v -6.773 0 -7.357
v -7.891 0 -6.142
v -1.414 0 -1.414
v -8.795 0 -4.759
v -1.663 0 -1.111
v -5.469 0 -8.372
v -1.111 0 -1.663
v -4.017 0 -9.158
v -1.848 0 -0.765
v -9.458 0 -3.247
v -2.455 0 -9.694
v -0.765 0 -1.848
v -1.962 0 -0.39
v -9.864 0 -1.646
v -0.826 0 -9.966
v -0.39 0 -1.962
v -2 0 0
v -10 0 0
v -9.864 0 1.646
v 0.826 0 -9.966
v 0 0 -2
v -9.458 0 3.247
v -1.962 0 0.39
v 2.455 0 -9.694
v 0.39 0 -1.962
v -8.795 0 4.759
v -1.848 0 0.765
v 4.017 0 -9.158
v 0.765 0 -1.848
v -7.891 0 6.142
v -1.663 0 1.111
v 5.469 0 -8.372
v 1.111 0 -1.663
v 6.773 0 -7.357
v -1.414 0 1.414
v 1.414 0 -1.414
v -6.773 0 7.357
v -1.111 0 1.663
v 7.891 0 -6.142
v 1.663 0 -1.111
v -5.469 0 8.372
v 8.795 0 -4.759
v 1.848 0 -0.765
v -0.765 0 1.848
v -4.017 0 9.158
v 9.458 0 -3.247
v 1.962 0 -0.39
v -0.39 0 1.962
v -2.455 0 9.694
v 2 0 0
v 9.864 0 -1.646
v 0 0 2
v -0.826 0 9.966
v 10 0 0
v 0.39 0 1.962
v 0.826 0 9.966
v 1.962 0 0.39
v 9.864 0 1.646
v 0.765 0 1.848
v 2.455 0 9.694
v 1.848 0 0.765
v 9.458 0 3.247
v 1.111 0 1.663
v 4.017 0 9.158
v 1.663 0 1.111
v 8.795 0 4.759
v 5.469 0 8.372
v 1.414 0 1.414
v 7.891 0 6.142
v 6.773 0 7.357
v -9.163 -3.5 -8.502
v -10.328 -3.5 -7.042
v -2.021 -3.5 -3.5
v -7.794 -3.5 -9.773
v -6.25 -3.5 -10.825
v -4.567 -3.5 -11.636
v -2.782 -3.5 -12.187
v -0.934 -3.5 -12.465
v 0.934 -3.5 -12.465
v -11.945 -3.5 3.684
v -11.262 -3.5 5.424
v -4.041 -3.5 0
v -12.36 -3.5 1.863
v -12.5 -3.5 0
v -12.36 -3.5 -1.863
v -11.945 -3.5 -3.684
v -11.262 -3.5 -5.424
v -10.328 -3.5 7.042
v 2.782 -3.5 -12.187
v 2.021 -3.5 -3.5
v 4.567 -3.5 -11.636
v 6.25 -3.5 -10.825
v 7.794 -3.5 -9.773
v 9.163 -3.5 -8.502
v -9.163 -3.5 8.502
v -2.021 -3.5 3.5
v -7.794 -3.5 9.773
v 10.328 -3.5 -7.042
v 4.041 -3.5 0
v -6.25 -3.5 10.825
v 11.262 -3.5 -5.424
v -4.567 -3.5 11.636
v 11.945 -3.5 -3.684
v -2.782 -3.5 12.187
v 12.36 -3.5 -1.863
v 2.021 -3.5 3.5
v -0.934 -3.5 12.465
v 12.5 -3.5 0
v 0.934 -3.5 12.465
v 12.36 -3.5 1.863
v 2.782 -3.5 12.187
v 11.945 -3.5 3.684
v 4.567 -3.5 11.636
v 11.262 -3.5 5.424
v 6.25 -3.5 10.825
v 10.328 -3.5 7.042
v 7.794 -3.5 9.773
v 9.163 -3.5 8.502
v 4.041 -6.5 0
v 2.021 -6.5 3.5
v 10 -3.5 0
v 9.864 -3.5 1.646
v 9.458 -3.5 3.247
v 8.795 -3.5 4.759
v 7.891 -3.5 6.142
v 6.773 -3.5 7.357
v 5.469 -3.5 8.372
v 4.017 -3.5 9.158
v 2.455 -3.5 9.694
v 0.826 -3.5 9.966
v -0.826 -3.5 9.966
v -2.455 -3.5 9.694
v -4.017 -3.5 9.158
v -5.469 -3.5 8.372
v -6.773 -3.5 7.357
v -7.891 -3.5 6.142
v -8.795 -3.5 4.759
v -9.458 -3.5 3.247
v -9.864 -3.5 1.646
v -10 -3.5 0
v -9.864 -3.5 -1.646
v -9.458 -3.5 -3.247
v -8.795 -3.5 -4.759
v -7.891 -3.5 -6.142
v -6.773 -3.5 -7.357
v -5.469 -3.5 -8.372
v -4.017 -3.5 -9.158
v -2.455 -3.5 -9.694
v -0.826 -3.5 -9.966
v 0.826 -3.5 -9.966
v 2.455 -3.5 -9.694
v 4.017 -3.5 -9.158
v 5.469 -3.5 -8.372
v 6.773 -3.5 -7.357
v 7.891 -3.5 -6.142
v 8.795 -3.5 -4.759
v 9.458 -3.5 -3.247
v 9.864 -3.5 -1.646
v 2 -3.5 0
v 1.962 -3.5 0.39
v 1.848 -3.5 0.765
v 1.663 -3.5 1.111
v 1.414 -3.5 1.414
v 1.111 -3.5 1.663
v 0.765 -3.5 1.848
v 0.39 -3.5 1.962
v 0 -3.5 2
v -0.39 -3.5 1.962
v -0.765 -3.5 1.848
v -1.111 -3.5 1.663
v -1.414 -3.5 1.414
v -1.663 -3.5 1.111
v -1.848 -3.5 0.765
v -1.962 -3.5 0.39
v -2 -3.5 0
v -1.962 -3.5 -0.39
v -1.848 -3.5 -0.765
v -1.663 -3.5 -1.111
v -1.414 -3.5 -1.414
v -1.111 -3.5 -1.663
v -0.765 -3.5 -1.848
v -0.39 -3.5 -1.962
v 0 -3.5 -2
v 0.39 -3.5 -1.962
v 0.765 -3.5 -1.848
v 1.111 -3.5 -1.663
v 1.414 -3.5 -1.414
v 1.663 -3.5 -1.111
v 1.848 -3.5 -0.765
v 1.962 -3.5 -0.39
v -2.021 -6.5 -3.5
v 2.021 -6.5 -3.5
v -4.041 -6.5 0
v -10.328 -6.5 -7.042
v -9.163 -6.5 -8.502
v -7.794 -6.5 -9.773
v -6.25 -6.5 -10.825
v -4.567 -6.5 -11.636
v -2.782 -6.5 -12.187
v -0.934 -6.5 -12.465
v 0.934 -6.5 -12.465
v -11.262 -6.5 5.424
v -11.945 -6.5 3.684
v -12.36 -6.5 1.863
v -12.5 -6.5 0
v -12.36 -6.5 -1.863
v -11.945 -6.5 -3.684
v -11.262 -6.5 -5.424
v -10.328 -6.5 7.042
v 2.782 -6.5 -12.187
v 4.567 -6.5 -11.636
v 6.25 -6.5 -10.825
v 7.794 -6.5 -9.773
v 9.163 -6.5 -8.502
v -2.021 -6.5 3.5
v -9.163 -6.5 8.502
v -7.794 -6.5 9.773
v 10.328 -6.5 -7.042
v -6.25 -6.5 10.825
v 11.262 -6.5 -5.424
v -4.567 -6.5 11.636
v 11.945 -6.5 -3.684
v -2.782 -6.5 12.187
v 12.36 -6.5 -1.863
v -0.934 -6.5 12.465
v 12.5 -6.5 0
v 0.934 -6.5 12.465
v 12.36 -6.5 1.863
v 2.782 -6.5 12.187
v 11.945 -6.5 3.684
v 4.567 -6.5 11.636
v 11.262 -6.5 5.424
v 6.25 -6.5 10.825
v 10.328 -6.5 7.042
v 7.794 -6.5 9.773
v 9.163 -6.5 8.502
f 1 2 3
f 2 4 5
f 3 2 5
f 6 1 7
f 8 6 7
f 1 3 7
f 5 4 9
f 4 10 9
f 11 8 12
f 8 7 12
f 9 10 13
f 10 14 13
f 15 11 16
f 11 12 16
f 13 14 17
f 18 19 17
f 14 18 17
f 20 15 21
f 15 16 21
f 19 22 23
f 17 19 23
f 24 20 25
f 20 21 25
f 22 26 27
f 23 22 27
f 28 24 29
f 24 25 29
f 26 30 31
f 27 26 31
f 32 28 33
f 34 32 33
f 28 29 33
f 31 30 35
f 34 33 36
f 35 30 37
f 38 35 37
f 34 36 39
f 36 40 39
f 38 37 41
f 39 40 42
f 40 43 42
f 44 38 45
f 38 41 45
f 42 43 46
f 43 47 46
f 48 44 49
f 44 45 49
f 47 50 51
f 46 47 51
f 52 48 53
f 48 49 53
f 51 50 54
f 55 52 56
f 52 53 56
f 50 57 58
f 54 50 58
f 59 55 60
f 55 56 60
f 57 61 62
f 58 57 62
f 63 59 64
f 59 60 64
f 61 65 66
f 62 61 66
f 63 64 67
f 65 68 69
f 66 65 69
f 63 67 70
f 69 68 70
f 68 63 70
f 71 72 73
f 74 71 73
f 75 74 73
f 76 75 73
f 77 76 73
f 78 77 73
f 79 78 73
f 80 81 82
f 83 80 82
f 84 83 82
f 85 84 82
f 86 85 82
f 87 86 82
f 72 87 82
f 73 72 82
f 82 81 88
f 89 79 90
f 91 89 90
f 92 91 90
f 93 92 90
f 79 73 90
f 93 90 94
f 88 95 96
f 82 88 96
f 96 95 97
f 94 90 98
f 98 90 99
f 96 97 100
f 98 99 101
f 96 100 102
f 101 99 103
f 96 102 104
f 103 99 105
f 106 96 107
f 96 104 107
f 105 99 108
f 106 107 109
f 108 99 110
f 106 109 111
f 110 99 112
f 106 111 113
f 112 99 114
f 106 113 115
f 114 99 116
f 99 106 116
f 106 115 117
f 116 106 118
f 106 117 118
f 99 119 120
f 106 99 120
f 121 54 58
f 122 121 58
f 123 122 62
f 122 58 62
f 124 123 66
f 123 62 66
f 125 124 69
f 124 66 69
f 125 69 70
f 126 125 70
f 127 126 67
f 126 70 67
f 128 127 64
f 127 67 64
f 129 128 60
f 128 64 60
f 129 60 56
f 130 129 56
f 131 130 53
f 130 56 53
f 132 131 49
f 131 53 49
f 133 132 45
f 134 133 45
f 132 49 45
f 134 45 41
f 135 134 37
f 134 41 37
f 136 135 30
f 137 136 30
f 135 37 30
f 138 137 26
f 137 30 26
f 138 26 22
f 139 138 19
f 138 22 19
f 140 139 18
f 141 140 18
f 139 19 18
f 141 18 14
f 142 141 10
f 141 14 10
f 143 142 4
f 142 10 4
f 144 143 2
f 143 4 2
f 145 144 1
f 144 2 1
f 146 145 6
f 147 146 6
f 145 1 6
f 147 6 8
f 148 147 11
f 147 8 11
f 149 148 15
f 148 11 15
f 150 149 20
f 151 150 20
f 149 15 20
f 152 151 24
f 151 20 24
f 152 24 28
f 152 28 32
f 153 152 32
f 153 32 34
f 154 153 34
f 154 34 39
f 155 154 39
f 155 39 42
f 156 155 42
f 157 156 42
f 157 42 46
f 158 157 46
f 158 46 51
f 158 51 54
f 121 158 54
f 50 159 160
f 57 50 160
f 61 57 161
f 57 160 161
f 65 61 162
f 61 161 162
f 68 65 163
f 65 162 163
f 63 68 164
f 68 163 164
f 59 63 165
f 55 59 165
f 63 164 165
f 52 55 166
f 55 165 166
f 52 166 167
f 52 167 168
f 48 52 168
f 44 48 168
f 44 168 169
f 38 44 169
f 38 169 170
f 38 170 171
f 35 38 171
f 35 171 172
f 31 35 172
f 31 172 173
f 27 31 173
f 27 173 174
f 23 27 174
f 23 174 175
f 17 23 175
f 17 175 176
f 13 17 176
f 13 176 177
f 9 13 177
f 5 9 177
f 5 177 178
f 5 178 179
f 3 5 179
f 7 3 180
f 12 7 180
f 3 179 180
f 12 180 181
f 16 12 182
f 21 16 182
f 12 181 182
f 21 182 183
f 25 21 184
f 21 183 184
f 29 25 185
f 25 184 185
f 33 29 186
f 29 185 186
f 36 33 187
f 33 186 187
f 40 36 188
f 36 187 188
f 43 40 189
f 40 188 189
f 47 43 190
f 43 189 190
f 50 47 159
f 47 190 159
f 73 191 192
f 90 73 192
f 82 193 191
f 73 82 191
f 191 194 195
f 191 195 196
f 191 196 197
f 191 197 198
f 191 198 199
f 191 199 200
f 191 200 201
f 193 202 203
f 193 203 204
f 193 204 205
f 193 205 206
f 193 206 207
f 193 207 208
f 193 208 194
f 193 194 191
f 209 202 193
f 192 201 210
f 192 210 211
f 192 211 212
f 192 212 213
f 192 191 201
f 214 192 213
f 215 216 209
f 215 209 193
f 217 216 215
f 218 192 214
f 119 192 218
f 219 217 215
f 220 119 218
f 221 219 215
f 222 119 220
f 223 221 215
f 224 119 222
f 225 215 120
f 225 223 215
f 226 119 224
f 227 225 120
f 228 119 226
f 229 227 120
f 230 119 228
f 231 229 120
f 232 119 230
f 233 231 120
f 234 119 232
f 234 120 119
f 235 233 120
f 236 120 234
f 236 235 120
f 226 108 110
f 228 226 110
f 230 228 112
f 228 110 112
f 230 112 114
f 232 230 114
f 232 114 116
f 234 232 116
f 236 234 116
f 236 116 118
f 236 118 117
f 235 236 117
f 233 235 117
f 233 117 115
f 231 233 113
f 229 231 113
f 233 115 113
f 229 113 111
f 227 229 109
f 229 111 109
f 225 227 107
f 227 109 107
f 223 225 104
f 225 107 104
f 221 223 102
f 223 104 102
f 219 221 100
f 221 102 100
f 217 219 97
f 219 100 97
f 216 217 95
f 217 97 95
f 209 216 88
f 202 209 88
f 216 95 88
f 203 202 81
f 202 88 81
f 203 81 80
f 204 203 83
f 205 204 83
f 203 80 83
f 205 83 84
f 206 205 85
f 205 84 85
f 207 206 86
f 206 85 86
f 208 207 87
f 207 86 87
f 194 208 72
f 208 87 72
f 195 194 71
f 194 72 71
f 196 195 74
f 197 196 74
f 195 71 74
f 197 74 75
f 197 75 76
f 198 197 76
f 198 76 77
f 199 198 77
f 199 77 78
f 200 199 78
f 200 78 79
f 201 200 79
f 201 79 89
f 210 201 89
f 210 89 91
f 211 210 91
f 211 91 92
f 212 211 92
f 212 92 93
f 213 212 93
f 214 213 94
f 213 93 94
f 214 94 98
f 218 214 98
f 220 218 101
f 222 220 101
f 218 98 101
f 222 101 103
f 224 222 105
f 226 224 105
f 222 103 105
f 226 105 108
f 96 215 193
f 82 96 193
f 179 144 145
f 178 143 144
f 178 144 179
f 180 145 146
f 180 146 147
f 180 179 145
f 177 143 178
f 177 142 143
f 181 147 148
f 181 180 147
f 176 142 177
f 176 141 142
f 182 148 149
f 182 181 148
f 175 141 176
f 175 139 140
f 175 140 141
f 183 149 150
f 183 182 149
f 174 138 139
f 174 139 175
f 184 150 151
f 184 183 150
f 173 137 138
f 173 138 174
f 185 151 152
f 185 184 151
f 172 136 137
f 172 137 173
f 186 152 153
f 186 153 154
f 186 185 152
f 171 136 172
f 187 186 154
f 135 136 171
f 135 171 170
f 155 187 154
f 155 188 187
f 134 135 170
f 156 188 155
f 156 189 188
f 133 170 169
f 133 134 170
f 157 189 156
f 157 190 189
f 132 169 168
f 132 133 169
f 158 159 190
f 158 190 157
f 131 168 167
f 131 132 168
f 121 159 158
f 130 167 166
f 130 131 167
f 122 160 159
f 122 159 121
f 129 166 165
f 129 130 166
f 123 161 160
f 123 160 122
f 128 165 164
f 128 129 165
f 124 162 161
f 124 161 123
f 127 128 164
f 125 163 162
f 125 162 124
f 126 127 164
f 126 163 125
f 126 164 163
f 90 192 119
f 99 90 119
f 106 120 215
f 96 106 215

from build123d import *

# Parameters (mm, degrees)
F0_R     = 10
F1_DEPTH = 3.5
F2_R     = 12.5
F2_R_2   = 10
F3_DEPTH = 3
F4_R     = 2
F5_DEPTH = 25
F7_DEPTH = 3


with BuildPart() as f1:
    # F0 (on Front) → F1 (new body)
    with BuildSketch(Plane.XZ):
        Circle(F0_R)
    extrude(amount=F1_DEPTH)


with BuildPart() as f3:
    # F2 (on face) → F3 (new body)
    with BuildSketch(Plane.XZ.offset(3.5)):
        Circle(F2_R)
        Circle(F2_R_2, mode=Mode.SUBTRACT)
        Circle(F2_R_2)
    extrude(amount=F3_DEPTH)


with BuildPart() as f5_tool:
    # F4 (on face) → F5 (new body)
    with BuildSketch(Plane.XZ.offset(6.5)):
        Circle(F4_R)
    extrude(amount=-F5_DEPTH)


with BuildPart() as f1_1:
    add(f1.part)

    # F5: cut by f5_tool
    add(f5_tool.part, mode=Mode.SUBTRACT)


with BuildPart() as f3_1:
    add(f3.part)

    # F5: cut by f5_tool
    add(f5_tool.part, mode=Mode.SUBTRACT)

    # F6 (on face) → F7 (cut)
    with BuildSketch(Plane.XZ.offset(6.5)):
        Polygon((2.020726, 3.5), (-2.020726, 3.5), (-4.041452, 0), (-2.020726, -3.5), (2.020726, -3.5), (4.041452, 0), align=None)
    extrude(amount=-F7_DEPTH, mode=Mode.SUBTRACT)


solid = Compound([f1_1.part, f3_1.part])
